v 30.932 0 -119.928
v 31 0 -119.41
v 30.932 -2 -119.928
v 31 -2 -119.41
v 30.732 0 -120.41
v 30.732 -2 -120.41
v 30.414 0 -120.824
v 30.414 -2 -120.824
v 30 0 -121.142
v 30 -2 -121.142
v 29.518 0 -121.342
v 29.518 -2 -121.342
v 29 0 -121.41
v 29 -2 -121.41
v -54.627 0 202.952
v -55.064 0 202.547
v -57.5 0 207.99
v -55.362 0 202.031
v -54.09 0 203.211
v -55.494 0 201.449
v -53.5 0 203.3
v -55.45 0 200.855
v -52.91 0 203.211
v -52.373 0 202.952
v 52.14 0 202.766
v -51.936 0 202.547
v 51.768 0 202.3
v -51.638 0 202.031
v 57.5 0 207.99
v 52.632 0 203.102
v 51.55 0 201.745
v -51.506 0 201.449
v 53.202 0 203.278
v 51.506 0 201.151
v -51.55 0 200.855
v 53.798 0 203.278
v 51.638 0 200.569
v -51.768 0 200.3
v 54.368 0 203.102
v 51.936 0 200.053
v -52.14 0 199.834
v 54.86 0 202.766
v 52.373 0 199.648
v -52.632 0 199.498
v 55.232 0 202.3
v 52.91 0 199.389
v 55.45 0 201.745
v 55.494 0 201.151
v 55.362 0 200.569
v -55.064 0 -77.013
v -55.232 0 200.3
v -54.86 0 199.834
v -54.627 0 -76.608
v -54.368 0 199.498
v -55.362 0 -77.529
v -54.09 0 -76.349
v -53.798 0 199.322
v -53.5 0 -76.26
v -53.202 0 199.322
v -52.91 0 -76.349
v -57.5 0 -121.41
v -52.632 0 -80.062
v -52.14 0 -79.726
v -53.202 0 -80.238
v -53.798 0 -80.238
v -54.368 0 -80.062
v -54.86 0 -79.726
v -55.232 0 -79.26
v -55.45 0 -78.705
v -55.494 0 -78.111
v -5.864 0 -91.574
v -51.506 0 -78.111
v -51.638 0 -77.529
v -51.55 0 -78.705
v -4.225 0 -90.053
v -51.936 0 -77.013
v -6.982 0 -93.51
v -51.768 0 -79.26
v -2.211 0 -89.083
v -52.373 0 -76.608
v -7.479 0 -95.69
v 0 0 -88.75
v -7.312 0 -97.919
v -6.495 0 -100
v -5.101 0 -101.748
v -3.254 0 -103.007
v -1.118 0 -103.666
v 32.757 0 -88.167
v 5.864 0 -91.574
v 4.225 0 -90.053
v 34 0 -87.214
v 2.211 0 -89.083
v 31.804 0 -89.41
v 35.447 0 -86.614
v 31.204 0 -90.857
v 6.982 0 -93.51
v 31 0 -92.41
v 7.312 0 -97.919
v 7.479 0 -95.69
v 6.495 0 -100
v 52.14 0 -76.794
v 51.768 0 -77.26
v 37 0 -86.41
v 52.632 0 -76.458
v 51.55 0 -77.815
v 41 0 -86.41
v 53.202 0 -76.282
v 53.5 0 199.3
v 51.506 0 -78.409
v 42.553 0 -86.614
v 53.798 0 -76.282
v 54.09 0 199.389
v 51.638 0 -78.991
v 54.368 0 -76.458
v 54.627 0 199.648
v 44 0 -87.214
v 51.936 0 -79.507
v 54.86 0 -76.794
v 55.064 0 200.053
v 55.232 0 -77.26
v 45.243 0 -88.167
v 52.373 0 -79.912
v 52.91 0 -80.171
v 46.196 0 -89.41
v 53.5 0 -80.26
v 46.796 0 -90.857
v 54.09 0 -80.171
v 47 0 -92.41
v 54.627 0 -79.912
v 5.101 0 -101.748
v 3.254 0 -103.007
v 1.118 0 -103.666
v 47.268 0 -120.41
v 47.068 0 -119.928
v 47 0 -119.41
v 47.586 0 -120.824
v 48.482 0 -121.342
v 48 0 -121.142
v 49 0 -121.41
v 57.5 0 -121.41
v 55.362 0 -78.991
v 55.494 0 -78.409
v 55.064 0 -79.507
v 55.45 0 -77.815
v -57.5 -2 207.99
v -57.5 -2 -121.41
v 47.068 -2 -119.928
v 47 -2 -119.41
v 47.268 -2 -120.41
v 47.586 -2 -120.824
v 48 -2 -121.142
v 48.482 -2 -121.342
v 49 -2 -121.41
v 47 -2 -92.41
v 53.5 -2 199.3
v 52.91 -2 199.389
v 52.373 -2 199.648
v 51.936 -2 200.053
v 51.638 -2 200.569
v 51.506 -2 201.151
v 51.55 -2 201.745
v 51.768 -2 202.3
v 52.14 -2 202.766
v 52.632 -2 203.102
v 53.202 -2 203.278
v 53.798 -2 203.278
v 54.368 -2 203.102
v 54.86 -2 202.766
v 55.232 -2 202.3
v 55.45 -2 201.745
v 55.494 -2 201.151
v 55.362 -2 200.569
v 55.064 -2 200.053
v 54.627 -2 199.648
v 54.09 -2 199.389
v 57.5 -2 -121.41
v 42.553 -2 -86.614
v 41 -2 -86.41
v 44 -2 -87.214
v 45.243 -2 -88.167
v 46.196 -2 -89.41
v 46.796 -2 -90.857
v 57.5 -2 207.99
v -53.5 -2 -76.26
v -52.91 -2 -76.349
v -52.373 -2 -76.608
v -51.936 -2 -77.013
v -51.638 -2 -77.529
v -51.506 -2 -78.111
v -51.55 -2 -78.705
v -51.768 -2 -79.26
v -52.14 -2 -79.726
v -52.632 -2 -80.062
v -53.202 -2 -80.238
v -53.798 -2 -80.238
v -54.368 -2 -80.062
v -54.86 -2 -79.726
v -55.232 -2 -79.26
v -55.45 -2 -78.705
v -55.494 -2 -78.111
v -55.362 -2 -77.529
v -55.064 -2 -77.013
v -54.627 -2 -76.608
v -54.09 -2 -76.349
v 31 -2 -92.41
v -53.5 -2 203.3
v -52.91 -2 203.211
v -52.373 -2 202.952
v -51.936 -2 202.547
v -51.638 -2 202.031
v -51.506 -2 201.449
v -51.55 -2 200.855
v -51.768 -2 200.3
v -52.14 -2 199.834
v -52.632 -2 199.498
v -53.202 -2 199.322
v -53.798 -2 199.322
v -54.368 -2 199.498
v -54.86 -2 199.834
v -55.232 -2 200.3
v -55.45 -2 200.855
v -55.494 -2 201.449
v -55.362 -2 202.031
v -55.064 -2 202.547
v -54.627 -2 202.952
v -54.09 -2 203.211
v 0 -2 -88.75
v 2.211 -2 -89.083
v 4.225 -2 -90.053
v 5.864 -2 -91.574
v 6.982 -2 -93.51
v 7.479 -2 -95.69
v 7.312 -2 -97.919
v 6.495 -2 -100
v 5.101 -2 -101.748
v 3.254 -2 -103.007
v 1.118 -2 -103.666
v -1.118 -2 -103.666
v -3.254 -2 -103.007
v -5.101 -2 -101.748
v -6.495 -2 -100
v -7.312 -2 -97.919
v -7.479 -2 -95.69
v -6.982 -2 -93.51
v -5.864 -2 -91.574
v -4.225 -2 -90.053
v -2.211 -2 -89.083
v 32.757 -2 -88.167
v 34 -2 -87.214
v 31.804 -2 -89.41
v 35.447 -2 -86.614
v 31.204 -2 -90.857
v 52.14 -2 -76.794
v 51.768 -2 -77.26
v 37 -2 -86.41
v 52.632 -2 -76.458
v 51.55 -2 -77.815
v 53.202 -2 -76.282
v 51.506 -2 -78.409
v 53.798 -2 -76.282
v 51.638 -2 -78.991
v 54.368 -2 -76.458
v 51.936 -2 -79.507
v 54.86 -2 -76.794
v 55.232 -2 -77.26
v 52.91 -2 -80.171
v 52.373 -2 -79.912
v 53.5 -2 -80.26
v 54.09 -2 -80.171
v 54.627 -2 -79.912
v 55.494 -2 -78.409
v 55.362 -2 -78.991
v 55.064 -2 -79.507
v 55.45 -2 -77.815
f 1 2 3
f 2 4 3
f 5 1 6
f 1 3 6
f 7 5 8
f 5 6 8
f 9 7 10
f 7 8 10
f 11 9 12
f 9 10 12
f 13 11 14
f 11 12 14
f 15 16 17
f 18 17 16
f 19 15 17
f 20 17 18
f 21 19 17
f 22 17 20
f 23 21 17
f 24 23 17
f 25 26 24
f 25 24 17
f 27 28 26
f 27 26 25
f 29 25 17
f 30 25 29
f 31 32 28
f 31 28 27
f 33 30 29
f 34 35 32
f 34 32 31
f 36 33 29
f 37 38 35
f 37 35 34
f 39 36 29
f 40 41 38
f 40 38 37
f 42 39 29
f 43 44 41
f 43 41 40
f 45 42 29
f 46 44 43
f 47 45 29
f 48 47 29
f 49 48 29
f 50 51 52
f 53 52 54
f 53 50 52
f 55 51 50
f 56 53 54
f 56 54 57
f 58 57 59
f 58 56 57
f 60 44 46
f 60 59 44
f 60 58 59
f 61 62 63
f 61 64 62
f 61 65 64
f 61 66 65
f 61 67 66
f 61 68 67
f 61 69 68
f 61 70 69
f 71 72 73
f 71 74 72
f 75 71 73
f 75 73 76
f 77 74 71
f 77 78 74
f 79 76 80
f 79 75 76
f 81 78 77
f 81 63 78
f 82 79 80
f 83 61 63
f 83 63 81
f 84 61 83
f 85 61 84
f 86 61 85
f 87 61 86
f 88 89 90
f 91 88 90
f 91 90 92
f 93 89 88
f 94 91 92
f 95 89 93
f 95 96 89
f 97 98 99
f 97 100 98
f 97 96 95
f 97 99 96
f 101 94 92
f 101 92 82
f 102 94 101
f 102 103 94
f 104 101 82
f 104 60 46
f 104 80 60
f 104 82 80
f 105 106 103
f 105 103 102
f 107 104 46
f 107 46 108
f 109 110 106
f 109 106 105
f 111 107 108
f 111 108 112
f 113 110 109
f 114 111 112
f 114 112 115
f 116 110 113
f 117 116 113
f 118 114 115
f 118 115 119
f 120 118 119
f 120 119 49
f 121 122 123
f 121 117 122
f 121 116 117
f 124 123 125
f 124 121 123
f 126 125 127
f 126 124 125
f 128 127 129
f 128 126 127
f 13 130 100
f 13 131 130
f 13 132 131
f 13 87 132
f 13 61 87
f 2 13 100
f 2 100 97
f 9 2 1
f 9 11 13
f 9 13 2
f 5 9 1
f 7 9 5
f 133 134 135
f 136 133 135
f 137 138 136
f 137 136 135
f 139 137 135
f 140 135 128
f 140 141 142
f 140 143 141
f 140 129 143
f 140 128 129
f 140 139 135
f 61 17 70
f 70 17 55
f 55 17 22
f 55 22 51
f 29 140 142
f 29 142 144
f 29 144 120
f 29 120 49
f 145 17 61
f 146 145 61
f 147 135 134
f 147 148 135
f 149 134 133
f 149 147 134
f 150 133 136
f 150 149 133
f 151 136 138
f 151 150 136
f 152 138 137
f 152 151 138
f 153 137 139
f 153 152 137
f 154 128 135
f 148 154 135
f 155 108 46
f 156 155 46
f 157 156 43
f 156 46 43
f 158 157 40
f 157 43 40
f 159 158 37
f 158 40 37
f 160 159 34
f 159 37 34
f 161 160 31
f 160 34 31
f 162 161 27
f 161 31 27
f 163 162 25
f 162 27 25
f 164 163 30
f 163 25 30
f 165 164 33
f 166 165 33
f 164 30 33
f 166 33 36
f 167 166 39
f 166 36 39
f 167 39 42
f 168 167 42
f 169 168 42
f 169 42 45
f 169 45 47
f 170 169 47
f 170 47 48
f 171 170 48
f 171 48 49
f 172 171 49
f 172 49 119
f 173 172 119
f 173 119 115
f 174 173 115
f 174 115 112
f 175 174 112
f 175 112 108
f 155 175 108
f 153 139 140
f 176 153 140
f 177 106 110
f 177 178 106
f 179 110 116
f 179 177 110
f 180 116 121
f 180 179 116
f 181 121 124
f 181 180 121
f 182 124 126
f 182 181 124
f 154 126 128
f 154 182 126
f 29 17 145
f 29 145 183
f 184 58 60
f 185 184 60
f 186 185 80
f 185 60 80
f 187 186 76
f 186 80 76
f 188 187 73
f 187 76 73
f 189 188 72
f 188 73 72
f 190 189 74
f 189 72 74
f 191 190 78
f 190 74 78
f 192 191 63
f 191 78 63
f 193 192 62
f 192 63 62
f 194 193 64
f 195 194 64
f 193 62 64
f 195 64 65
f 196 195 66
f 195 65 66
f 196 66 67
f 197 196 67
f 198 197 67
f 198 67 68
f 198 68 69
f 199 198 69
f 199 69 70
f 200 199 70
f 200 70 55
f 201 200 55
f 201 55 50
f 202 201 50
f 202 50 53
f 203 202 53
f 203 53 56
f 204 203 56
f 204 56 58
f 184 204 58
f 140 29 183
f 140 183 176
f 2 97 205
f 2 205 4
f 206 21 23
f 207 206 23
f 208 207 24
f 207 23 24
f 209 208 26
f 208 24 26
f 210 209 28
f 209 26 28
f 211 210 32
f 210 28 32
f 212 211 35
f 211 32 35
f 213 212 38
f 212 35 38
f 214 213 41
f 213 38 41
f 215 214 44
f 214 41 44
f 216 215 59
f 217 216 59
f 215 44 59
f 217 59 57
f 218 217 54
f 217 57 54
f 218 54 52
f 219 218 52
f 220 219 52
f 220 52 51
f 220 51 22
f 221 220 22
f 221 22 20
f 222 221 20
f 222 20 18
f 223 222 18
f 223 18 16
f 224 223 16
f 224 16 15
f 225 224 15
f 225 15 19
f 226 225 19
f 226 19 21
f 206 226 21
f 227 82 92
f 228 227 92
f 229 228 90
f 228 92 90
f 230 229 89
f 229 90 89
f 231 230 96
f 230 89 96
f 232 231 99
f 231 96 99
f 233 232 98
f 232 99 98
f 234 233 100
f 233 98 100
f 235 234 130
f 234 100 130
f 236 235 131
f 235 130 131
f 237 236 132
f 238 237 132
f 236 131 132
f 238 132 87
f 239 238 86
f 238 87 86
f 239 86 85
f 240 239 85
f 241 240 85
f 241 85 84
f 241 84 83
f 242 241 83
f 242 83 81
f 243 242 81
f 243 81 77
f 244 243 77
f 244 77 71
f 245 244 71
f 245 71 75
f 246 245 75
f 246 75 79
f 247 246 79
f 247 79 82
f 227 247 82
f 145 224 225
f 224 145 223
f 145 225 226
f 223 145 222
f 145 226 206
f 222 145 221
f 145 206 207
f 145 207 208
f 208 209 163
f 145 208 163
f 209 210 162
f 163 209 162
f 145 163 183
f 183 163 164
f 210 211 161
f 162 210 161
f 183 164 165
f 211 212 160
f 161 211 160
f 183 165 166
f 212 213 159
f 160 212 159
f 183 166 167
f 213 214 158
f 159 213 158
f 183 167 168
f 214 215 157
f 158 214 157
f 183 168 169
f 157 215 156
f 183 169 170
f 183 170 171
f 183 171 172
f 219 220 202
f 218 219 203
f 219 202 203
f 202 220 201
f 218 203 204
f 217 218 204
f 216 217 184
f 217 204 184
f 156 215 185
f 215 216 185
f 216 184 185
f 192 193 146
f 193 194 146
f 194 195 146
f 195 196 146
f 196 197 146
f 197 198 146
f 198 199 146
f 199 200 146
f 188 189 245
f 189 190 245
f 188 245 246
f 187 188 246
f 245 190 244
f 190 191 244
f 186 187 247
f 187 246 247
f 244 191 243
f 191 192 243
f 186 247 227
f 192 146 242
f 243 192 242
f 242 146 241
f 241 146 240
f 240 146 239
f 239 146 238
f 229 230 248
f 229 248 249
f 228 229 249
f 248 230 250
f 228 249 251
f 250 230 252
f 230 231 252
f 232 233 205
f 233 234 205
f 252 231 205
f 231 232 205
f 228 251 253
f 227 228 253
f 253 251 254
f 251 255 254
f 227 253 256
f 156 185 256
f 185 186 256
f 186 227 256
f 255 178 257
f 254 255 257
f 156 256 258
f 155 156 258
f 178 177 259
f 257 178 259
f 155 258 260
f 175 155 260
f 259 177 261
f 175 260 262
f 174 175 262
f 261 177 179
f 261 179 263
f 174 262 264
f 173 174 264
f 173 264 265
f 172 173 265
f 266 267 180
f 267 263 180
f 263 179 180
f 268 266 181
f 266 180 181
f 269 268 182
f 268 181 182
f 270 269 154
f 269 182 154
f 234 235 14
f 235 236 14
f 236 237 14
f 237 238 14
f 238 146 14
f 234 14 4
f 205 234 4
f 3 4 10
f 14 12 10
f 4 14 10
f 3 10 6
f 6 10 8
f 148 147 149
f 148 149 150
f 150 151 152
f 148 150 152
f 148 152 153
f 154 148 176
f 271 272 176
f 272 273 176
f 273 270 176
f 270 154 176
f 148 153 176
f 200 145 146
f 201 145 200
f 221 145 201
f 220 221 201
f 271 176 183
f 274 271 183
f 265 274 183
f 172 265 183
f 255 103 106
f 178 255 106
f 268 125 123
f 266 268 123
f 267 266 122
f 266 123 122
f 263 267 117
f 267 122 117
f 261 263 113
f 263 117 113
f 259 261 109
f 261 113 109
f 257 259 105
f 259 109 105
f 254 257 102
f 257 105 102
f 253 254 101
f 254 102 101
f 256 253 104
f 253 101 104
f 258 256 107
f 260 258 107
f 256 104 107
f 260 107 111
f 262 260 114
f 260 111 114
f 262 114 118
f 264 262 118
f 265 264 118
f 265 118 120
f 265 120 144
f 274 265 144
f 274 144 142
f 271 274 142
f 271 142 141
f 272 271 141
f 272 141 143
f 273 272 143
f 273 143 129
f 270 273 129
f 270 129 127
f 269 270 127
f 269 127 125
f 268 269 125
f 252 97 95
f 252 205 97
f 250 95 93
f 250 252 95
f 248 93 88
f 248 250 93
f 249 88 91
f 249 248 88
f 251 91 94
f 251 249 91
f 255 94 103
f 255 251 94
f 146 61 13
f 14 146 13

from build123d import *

# Parameters (mm, degrees)
CROQUIS12_W           = 115
CROQUIS12_H           = 329.4
BRIDA_BASE2_DEPTH     = 2
CORTAR_EXTRUIR6_REACH = 217.801
CROQUIS27_R           = 2
CORTAR_EXTRUIR7_REACH = 217.801
CROQUIS28_R           = 7.5
CROQUIS29_W           = 16
CROQUIS29_H           = 35
CORTAR_EXTRUIR8_DEPTH = 216.801042861
REDONDEO1_R           = 6
REDONDEO2_R           = 2


# Sheet-metal steps are written as plain solids
with BuildPart() as part:
    # Croquis12 → Brida base2 (new body)
    with BuildSketch(Plane(origin=(0, 0, 0), x_dir=(1, 0, 0), z_dir=(0, 1, 0))):
        with Locations((0, -43.29)):
            Rectangle(CROQUIS12_W, CROQUIS12_H)
    extrude(amount=-BRIDA_BASE2_DEPTH)

    # Croquis27 → Cortar-Extruir6 (cut, up to next)
    with BuildSketch(Plane(origin=(0, 0, 0), x_dir=(1, 0, 0), z_dir=(0, 1, 0)), mode=Mode.PRIVATE) as cortar_extruir6_sk1:
        with Locations(Location((-53.5, -201.3, 0), (0, 0, 270))):
            Circle(CROQUIS27_R)
    cortar_extruir6_tool1 = extrude(cortar_extruir6_sk1.sketch, amount=-CORTAR_EXTRUIR6_REACH, mode=Mode.PRIVATE) & part.part
    # Croquis27 → Cortar-Extruir6 (cut, up to next)
    with BuildSketch(Plane(origin=(0, 0, 0), x_dir=(1, 0, 0), z_dir=(0, 1, 0)), mode=Mode.PRIVATE) as cortar_extruir6_sk2:
        with Locations(Location((-53.5, 78.26, 0), (0, 0, 270))):
            Circle(CROQUIS27_R)
    cortar_extruir6_tool2 = extrude(cortar_extruir6_sk2.sketch, amount=-CORTAR_EXTRUIR6_REACH, mode=Mode.PRIVATE) & part.part
    # Croquis27 → Cortar-Extruir6 (cut, up to next)
    with BuildSketch(Plane(origin=(0, 0, 0), x_dir=(1, 0, 0), z_dir=(0, 1, 0)), mode=Mode.PRIVATE) as cortar_extruir6_sk3:
        with Locations(Location((53.5, 78.26, 0), (0, 0, 90))):
            Circle(CROQUIS27_R)
    cortar_extruir6_tool3 = extrude(cortar_extruir6_sk3.sketch, amount=-CORTAR_EXTRUIR6_REACH, mode=Mode.PRIVATE) & part.part
    # Croquis27 → Cortar-Extruir6 (cut, up to next)
    with BuildSketch(Plane(origin=(0, 0, 0), x_dir=(1, 0, 0), z_dir=(0, 1, 0)), mode=Mode.PRIVATE) as cortar_extruir6_sk4:
        with Locations(Location((53.5, -201.3, 0), (0, 0, 90))):
            Circle(CROQUIS27_R)
    cortar_extruir6_tool4 = extrude(cortar_extruir6_sk4.sketch, amount=-CORTAR_EXTRUIR6_REACH, mode=Mode.PRIVATE) & part.part
    add(cortar_extruir6_tool1.solids().sort_by_distance((-53.5, 0, 201.3))[0], mode=Mode.SUBTRACT)
    add(cortar_extruir6_tool2.solids().sort_by_distance((-53.5, 0, -78.26))[0], mode=Mode.SUBTRACT)
    add(cortar_extruir6_tool3.solids().sort_by_distance((53.5, 0, -78.26))[0], mode=Mode.SUBTRACT)
    add(cortar_extruir6_tool4.solids().sort_by_distance((53.5, 0, 201.3))[0], mode=Mode.SUBTRACT)

    # Croquis28 → Cortar-Extruir7 (cut, up to next)
    with BuildSketch(Plane(origin=(0, 0, 0), x_dir=(1, 0, 0), z_dir=(0, 1, 0)), mode=Mode.PRIVATE) as cortar_extruir7_sk1:
        with Locations(Location((0, 96.25, 0), (0, 0, 270))):
            Circle(CROQUIS28_R)
    cortar_extruir7_tool1 = extrude(cortar_extruir7_sk1.sketch, amount=-CORTAR_EXTRUIR7_REACH, mode=Mode.PRIVATE) & part.part
    add(cortar_extruir7_tool1.solids().sort_by_distance((0, 0, -96.25))[0], mode=Mode.SUBTRACT)

    # Croquis29 → Cortar-Extruir8 (cut, through all)
    with BuildSketch(Plane(origin=(0, 0, 0), x_dir=(1, 0, 0), z_dir=(0, 1, 0))):
        with Locations((39, 103.91)):
            Rectangle(CROQUIS29_W, CROQUIS29_H)
    extrude(amount=-CORTAR_EXTRUIR8_DEPTH, mode=Mode.SUBTRACT)

    # Redondeo1
    redondeo1_edges = [part.edges().sort_by_distance(p)[0] for p in [
        (31, -1, -86.41),
        (47, -1, -86.41),
    ]]
    fillet(redondeo1_edges, radius=REDONDEO1_R)

    # Redondeo2
    redondeo2_edges = [part.edges().sort_by_distance(p)[0] for p in [
        (31, -1, -121.41),
        (47, -1, -121.41),
    ]]
    fillet(redondeo2_edges, radius=REDONDEO2_R)


solid = part.part
